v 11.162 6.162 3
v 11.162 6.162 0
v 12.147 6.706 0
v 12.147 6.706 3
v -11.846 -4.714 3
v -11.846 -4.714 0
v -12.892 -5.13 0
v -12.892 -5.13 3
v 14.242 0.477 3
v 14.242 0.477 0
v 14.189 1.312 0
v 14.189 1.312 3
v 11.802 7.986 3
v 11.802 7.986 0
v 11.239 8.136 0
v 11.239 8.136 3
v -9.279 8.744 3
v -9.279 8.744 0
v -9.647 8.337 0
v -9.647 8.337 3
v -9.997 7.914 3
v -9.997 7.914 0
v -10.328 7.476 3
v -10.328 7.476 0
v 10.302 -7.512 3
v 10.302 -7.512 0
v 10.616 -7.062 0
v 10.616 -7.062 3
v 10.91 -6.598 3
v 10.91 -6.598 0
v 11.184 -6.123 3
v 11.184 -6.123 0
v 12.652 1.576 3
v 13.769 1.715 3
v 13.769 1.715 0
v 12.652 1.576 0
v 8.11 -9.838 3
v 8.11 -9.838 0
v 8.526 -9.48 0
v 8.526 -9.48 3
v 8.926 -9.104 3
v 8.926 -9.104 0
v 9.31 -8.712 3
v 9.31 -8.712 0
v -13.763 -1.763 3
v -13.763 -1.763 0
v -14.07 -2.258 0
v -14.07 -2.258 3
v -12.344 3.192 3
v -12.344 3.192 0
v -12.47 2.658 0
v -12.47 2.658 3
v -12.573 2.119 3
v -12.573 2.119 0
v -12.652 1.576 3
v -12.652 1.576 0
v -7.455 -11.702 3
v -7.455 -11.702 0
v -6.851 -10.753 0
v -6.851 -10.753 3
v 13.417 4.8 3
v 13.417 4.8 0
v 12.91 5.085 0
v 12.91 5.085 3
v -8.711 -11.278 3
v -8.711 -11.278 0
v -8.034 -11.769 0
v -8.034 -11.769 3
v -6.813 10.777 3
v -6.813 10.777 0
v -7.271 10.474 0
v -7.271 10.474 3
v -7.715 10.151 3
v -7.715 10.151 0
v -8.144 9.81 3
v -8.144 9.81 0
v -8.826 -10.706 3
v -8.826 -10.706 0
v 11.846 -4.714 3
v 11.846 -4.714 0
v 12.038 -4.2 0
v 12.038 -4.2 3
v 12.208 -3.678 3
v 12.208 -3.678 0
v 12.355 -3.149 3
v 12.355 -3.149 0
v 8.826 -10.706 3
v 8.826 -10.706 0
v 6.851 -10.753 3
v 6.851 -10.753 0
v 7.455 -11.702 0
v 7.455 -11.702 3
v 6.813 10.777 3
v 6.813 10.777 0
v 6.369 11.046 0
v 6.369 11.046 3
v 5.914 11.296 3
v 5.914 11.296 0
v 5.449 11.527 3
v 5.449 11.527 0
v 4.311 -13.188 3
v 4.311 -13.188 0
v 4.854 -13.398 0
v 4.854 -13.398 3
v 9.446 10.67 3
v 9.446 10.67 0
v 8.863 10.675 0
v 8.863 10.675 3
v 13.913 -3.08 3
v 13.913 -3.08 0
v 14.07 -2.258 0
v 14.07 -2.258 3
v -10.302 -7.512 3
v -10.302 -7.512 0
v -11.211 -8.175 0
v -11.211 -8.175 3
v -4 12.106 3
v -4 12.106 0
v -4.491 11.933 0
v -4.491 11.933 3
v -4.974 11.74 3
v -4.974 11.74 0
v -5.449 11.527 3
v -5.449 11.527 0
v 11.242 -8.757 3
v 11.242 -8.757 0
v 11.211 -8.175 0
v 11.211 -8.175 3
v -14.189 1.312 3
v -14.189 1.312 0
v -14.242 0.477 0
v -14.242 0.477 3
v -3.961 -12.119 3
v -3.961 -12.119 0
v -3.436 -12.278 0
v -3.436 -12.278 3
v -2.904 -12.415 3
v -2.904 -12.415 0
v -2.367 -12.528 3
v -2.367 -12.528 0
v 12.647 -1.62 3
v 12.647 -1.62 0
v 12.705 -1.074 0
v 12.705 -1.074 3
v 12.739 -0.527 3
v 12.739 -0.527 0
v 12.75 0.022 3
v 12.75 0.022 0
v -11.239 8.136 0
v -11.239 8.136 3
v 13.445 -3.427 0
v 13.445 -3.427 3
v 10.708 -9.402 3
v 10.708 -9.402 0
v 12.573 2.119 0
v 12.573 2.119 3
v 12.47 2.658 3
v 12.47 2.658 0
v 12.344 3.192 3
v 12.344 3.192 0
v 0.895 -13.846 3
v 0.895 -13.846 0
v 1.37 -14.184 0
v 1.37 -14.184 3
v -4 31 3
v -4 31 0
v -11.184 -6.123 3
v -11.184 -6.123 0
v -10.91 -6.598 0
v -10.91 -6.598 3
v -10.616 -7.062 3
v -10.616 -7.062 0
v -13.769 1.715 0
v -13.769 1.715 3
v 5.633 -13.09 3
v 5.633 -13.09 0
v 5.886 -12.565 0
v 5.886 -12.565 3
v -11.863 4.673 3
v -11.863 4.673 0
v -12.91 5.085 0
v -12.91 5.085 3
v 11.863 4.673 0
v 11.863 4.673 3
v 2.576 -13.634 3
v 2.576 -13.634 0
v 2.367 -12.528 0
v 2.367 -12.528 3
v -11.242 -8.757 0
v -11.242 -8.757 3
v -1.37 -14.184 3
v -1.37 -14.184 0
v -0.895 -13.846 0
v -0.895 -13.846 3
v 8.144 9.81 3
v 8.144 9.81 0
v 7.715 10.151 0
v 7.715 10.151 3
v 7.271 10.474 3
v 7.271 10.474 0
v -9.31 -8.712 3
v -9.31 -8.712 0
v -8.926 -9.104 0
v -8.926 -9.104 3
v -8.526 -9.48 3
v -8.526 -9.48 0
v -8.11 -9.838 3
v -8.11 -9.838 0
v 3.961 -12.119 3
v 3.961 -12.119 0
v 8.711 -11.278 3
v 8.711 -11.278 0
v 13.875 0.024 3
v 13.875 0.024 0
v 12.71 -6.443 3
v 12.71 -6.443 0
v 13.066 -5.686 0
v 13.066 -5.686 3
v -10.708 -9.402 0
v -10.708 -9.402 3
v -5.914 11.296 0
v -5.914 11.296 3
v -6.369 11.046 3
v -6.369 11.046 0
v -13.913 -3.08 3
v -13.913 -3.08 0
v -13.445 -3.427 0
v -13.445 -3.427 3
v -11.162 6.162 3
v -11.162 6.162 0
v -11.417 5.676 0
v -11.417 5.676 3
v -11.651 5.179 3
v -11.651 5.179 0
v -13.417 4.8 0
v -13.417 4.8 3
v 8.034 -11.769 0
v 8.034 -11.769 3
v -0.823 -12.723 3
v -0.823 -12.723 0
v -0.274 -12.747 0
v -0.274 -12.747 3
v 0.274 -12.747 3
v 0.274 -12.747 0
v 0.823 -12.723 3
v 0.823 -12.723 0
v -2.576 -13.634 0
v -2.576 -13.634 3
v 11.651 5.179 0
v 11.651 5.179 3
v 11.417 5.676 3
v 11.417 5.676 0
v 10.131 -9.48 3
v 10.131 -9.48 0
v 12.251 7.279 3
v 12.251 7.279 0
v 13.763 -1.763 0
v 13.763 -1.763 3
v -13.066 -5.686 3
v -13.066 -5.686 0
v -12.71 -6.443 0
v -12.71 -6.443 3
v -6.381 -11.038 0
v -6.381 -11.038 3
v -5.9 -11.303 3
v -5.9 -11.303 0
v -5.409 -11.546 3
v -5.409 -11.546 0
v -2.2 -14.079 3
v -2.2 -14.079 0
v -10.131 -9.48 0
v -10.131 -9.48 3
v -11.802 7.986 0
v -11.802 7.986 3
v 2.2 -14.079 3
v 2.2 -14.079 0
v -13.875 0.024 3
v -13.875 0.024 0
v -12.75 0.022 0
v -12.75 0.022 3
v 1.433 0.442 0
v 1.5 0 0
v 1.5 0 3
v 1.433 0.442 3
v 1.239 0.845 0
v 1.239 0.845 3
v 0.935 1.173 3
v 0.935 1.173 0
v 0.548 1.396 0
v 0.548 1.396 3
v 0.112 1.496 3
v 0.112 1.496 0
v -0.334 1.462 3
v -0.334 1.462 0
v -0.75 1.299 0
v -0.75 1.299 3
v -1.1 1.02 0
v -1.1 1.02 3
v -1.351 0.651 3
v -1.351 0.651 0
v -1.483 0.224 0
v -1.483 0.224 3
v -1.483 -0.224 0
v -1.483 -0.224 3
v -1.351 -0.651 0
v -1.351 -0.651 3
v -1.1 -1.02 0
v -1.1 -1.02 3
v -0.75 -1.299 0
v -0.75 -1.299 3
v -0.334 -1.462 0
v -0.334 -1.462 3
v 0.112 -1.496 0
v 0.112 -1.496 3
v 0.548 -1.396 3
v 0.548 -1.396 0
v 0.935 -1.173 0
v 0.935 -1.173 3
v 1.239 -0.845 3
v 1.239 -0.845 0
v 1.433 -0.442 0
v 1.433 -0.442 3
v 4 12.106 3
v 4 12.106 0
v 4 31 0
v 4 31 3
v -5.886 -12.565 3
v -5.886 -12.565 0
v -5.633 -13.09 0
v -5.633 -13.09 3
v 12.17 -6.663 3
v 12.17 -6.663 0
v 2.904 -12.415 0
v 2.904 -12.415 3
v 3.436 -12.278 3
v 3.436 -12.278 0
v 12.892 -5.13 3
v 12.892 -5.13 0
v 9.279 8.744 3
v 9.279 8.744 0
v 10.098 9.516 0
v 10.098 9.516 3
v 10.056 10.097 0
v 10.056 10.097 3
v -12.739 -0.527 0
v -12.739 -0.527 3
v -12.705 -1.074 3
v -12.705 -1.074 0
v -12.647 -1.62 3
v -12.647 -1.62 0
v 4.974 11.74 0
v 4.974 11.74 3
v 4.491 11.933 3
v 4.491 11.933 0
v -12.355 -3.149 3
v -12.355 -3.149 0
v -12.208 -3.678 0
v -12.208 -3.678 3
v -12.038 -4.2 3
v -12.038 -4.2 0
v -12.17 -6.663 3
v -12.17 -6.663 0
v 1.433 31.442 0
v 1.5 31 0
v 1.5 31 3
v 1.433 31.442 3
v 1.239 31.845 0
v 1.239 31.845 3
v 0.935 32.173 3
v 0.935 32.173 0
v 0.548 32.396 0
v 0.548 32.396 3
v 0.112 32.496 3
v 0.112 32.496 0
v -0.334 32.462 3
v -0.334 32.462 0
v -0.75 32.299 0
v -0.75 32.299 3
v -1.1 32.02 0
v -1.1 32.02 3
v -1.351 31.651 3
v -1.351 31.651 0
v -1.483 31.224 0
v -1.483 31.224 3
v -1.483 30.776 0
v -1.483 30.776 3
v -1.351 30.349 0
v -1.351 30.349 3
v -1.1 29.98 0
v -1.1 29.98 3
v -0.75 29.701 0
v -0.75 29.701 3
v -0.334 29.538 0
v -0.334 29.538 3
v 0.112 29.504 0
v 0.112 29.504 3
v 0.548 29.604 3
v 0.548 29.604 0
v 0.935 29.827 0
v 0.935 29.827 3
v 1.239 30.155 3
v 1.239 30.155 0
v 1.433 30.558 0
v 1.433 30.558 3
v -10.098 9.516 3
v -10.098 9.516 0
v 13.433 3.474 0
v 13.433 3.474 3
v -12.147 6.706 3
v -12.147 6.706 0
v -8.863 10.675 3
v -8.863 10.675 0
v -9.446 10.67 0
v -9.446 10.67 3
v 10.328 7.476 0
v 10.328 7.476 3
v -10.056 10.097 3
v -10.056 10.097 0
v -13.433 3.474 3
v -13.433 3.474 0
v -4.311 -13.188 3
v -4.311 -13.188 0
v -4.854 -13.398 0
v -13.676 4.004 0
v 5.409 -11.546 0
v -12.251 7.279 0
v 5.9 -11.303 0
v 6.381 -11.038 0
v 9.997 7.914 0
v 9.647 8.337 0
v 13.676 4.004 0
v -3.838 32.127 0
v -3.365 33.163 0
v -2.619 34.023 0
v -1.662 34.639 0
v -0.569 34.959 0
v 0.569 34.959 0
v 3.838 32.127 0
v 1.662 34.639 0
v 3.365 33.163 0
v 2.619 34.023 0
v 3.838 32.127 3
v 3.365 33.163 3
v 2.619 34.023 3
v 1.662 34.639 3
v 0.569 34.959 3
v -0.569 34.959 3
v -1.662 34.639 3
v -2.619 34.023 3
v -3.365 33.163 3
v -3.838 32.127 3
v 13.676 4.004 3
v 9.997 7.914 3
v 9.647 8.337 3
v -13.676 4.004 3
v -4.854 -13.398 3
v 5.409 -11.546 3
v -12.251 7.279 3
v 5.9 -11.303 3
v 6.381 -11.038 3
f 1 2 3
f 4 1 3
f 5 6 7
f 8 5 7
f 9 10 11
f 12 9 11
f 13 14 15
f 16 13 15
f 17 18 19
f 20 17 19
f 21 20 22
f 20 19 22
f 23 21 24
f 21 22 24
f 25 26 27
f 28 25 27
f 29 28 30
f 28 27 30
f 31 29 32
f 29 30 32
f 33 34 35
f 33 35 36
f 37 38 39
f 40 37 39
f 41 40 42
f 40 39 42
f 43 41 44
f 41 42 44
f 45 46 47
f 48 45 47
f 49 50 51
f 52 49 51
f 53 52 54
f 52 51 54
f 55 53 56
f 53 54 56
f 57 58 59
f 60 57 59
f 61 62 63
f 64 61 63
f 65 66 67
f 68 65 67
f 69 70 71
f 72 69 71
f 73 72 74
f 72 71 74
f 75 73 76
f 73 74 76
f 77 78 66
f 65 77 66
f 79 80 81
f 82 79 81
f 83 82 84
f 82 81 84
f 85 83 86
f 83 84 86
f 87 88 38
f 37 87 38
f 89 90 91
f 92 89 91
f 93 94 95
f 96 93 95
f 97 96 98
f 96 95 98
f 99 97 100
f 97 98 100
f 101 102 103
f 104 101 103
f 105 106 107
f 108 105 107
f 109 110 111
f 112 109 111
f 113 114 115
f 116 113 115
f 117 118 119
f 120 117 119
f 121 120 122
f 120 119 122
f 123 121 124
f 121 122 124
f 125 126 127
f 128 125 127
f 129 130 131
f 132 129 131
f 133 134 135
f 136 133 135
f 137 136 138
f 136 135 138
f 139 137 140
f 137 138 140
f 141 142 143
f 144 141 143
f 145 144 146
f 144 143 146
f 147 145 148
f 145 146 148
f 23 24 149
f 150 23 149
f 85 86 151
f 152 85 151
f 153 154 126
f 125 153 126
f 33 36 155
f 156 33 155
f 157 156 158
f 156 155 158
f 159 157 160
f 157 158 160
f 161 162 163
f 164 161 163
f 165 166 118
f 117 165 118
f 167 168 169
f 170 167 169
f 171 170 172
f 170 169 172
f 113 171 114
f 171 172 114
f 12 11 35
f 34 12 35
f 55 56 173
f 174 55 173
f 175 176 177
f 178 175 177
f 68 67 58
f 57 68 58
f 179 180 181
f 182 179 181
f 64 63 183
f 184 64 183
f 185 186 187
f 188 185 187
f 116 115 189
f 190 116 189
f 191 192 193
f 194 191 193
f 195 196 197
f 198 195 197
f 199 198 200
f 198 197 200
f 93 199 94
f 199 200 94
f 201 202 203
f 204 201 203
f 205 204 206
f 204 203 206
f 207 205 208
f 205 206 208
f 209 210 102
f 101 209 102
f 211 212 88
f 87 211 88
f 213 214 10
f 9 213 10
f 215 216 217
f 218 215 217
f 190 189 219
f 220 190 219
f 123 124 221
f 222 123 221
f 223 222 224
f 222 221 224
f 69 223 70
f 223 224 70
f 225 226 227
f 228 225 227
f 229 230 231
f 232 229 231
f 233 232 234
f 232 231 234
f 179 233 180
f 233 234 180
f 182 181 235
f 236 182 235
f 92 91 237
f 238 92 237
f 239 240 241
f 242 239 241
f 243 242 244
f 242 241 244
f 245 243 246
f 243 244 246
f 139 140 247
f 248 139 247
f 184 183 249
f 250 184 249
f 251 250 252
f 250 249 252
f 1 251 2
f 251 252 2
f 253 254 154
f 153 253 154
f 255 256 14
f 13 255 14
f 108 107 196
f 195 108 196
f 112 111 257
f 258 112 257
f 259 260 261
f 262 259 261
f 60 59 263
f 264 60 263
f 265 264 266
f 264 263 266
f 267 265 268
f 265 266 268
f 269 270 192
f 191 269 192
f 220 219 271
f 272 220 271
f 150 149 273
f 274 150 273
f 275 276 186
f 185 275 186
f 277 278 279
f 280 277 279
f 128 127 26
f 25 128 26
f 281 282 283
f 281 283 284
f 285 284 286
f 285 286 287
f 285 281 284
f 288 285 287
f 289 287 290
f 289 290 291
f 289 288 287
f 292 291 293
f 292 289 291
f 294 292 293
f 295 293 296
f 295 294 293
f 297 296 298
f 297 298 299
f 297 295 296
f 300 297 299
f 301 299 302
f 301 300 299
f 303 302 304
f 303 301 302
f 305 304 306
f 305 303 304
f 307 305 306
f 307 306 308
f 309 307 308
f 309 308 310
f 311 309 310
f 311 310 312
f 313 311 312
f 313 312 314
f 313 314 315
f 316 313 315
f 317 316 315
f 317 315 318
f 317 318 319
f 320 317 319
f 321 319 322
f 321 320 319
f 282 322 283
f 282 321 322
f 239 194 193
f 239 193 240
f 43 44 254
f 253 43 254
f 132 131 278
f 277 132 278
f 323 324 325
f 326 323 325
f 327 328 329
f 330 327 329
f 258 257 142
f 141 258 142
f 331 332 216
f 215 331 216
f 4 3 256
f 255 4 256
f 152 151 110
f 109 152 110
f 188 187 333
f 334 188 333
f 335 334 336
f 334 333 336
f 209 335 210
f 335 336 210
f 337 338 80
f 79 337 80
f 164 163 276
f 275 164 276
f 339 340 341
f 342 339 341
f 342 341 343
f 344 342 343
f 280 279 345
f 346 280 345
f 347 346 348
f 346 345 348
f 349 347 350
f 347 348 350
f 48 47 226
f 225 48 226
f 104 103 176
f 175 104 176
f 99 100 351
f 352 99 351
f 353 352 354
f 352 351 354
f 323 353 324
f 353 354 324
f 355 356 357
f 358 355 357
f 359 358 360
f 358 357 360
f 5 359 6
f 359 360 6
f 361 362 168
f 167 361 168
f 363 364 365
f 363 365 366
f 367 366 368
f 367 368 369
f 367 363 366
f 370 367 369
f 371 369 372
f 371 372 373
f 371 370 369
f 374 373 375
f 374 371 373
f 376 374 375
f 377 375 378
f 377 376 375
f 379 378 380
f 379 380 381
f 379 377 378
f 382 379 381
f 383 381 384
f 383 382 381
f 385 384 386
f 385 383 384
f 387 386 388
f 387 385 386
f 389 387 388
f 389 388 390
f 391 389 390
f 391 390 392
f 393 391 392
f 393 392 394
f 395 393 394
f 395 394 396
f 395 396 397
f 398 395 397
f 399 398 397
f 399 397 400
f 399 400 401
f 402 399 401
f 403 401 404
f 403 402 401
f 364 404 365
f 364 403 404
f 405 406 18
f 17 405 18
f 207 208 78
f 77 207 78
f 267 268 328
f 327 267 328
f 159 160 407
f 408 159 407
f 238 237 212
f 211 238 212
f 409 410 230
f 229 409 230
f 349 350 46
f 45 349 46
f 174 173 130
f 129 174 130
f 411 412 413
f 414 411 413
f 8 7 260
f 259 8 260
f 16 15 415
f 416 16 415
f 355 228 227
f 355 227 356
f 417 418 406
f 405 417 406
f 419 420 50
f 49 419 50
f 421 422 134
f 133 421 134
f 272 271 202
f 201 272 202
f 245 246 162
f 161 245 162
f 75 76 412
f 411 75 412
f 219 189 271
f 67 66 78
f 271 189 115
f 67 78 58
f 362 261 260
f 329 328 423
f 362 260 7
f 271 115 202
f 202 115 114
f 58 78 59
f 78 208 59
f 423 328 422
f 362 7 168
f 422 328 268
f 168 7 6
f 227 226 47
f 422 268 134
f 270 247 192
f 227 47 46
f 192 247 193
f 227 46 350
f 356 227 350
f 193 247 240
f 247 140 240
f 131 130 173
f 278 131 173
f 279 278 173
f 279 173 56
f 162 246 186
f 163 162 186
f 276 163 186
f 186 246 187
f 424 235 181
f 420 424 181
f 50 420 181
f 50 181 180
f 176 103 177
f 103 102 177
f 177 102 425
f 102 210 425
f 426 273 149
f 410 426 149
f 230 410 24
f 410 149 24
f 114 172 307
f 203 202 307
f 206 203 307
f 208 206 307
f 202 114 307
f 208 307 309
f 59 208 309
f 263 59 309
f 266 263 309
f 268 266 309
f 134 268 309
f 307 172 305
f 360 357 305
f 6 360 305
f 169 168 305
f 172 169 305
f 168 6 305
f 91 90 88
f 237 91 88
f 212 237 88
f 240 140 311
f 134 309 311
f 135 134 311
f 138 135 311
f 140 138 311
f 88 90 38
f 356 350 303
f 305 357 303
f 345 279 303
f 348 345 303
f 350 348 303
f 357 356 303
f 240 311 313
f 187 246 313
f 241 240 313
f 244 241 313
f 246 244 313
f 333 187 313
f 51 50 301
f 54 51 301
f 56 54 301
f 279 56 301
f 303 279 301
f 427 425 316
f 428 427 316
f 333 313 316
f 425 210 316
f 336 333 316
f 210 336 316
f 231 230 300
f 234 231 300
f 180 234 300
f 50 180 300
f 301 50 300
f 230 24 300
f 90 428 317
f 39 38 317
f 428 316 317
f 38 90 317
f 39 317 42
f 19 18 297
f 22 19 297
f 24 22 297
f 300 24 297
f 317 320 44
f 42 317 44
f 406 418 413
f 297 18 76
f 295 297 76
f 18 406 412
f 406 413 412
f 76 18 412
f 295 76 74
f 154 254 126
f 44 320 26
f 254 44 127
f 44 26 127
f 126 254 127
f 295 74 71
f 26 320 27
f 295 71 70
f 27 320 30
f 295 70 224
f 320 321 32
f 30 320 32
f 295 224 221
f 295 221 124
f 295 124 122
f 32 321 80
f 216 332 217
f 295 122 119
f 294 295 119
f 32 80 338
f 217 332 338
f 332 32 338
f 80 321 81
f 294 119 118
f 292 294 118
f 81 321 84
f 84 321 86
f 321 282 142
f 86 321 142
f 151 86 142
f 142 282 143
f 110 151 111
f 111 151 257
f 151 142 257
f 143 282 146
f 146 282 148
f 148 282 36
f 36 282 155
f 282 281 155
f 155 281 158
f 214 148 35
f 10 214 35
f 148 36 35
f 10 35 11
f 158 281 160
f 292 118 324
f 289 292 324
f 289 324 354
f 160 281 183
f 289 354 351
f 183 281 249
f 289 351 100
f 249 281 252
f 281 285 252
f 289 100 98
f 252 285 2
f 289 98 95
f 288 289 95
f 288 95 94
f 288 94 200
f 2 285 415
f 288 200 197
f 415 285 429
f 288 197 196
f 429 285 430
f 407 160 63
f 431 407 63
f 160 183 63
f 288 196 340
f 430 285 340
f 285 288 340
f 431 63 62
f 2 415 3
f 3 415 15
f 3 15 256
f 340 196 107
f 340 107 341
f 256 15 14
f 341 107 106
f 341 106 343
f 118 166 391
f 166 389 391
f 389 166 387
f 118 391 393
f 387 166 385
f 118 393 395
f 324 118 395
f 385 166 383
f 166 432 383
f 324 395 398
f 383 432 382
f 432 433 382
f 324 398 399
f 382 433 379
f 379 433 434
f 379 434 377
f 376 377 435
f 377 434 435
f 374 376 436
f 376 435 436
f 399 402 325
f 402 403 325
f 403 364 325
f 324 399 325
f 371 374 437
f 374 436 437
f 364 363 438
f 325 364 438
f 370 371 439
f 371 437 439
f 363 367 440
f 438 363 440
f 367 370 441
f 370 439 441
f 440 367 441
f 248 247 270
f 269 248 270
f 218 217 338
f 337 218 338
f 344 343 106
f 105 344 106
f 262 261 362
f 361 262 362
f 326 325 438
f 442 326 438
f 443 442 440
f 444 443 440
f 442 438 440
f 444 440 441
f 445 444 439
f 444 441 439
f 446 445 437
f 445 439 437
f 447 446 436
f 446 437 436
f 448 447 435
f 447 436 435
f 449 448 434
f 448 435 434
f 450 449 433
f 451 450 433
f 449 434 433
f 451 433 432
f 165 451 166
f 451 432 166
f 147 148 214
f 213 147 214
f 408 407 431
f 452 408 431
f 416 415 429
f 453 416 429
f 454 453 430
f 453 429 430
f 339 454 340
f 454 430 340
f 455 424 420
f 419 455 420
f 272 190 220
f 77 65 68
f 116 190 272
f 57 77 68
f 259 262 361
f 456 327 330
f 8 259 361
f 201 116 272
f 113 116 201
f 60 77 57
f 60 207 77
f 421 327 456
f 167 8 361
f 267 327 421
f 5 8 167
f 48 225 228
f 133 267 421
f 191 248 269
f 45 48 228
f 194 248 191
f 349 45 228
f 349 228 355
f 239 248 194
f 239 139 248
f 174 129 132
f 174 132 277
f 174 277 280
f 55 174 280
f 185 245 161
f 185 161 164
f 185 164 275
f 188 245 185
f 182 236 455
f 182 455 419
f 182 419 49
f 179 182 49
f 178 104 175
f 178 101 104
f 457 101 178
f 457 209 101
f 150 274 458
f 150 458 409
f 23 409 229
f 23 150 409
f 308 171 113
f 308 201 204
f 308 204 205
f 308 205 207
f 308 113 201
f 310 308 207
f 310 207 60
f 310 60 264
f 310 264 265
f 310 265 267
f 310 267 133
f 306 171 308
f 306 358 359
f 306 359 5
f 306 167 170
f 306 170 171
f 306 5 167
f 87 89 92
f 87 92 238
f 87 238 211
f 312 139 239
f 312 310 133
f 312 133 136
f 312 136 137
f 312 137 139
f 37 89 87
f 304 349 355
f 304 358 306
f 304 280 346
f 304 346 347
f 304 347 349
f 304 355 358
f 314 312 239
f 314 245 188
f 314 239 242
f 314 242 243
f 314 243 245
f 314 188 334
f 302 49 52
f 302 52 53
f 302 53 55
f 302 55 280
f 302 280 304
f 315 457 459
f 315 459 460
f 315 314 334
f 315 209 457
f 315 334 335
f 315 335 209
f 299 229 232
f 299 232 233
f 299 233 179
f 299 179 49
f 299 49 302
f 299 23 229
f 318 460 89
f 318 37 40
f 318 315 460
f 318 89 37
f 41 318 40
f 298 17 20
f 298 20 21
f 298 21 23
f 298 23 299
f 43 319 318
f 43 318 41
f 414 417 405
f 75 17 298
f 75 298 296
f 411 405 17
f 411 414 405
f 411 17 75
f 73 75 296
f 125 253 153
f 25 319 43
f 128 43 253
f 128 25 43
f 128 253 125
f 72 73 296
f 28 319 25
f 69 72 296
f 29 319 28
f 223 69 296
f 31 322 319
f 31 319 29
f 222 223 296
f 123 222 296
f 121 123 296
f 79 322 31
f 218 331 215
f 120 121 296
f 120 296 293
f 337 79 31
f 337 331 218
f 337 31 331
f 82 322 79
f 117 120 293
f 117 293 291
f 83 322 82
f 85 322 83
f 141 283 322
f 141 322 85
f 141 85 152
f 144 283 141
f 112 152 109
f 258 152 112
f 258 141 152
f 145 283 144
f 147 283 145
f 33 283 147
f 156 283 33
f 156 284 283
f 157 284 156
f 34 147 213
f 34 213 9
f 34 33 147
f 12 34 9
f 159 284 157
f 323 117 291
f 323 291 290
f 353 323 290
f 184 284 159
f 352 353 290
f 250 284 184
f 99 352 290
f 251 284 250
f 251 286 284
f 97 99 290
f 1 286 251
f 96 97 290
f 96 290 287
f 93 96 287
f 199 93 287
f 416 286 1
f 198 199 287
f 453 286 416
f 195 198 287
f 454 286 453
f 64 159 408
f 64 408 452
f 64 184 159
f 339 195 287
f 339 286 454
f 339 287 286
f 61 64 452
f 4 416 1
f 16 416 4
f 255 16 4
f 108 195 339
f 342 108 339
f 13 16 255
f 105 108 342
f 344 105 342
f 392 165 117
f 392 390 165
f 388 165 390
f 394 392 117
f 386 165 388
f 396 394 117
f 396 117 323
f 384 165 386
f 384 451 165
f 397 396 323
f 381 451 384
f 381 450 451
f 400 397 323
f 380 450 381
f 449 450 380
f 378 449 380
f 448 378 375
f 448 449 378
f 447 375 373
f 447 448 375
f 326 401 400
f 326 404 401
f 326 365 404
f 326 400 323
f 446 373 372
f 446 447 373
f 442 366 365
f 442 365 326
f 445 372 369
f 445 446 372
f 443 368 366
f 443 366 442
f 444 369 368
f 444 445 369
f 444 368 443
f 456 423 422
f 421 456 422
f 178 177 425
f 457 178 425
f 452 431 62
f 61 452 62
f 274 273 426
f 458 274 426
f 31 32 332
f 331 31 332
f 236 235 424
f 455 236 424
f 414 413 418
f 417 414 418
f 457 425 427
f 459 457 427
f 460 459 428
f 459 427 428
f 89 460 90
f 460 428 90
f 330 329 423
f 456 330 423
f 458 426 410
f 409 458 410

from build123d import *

# Parameters (mm, degrees)
SKETCH1_R           = 1.5
BOSS_EXTRUDE2_DEPTH = 3


with BuildPart() as part:
    # Sketch1 → Boss-Extrude2 (new body)
    with BuildSketch(Plane.XY):
        with BuildLine():
            Line((-4, 31), (-4, 12.106300013))
            ThreePointArc((-4, 12.106300013), (-4.733275563, 11.838859846), (-5.448812758, 11.527052508))
            ThreePointArc((-5.448812758, 11.527052508), (-6.142359345, 11.172910171), (-6.812992455, 10.777088374))
            ThreePointArc((-6.812992455, 10.777088374), (-7.494261967, 10.314966678), (-8.144289673, 9.809844327))
            Line((-8.144289673, 9.809844327), (-8.862903468, 10.675418826))
            Line((-8.862903468, 10.675418826), (-9.445525531, 10.669796035))
            Line((-9.445525531, 10.669796035), (-10.055652175, 10.096848981))
            Line((-10.055652175, 10.096848981), (-10.097847012, 9.515729647))
            Line((-10.097847012, 9.515729647), (-9.27910266, 8.744184))
            ThreePointArc((-9.27910266, 8.744184), (-9.824043845, 8.127155869), (-10.328030916, 7.476247548))
            Line((-10.328030916, 7.476247548), (-11.239327761, 8.13591645))
            Line((-11.239327761, 8.13591645), (-11.80224735, 7.985578094))
            Line((-11.80224735, 7.985578094), (-12.250719604, 7.278898898))
            Line((-12.250719604, 7.278898898), (-12.147070312, 6.705543068))
            Line((-12.147070312, 6.705543068), (-11.162172719, 6.161850387))
            ThreePointArc((-11.162172719, 6.161850387), (-11.536544919, 5.428685967), (-11.862823992, 4.672890641))
            Line((-11.862823992, 4.672890641), (-12.909543756, 5.085204521))
            Line((-12.909543756, 5.085204521), (-13.417390562, 4.799596912))
            Line((-13.417390562, 4.799596912), (-13.676029266, 4.003588828))
            Line((-13.676029266, 4.003588828), (-13.43304851, 3.474022556))
            Line((-13.43304851, 3.474022556), (-12.343882415, 3.192345052))
            ThreePointArc((-12.343882415, 3.192345052), (-12.524162447, 2.389111761), (-12.652232208, 1.575918828))
            Line((-12.652232208, 1.575918828), (-13.768605638, 1.71497049))
            Line((-13.768605638, 1.71497049), (-14.189469779, 1.312039404))
            Line((-14.189469779, 1.312039404), (-14.242023712, 0.476718548))
            Line((-14.242023712, 0.476718548), (-13.874978867, 0.024216431))
            Line((-13.874978867, 0.024216431), (-12.749980581, 0.022252937))
            ThreePointArc((-12.749980581, 0.022252937), (-12.724840787, -0.800579124), (-12.646654143, -1.62007376))
            Line((-12.646654143, -1.62007376), (-13.762535391, -1.763021444))
            Line((-13.762535391, -1.763021444), (-14.069972424, -2.257958364))
            Line((-14.069972424, -2.257958364), (-13.91313943, -3.080105712))
            Line((-13.91313943, -3.080105712), (-13.445093273, -3.427111302))
            Line((-13.445093273, -3.427111302), (-12.354950575, -3.149237412))
            ThreePointArc((-12.354950575, -3.149237412), (-12.125970583, -3.939966678), (-11.846440287, -4.714271155))
            Line((-11.846440287, -4.714271155), (-12.89171443, -5.130236257))
            Line((-12.89171443, -5.130236257), (-13.066406957, -5.686080305))
            Line((-13.066406957, -5.686080305), (-12.710041429, -6.443395602))
            Line((-12.710041429, -6.443395602), (-12.170403021, -6.663101027))
            Line((-12.170403021, -6.663101027), (-11.183613587, -6.122849592))
            ThreePointArc((-11.183613587, -6.122849592), (-10.76518105, -6.831791636), (-10.30187102, -7.512253556))
            Line((-10.30187102, -7.512253556), (-11.210859639, -8.175099458))
            Line((-11.210859639, -8.175099458), (-11.241831085, -8.756924908))
            Line((-11.241831085, -8.756924908), (-10.70832478, -9.401823249))
            Line((-10.70832478, -9.401823249), (-10.131001588, -9.48042361))
            Line((-10.131001588, -9.48042361), (-9.309569027, -8.711740614))
            ThreePointArc((-9.309569027, -8.711740614), (-8.727975601, -9.29435), (-8.109997309, -9.838213438))
            Line((-8.109997309, -9.838213438), (-8.825585306, -10.706291095))
            Line((-8.825585306, -10.706291095), (-8.710889622, -11.277539713))
            Line((-8.710889622, -11.277539713), (-8.033764703, -11.769499764))
            Line((-8.033764703, -11.769499764), (-7.455032066, -11.702056311))
            Line((-7.455032066, -11.702056311), (-6.850570006, -10.753240934))
            ThreePointArc((-6.850570006, -10.753240934), (-6.142359345, -11.172910171), (-5.40854264, -11.546002187))
            Line((-5.40854264, -11.546002187), (-5.885766991, -12.564767086))
            Line((-5.885766991, -12.564767086), (-5.632610928, -13.089545223))
            Line((-5.632610928, -13.089545223), (-4.854413643, -13.397655324))
            Line((-4.854413643, -13.397655324), (-4.310635461, -13.188405776))
            Line((-4.310635461, -13.188405776), (-3.961124478, -12.119075578))
            ThreePointArc((-3.961124478, -12.119075578), (-3.170796061, -12.349435304), (-2.367249346, -12.528313156))
            Line((-2.367249346, -12.528313156), (-2.576124288, -13.633752552))
            Line((-2.576124288, -13.633752552), (-2.200414573, -14.079086466))
            Line((-2.200414573, -14.079086466), (-1.370041921, -14.183986927))
            Line((-1.370041921, -14.183986927), (-0.895385777, -13.846079204))
            Line((-0.895385777, -13.846079204), (-0.82278693, -12.723424133))
            ThreePointArc((-0.82278693, -12.723424133), (0, -12.75), (0.82278693, -12.723424133))
            Line((0.82278693, -12.723424133), (0.895385777, -13.846079204))
            Line((0.895385777, -13.846079204), (1.370041921, -14.183986927))
            Line((1.370041921, -14.183986927), (2.200414573, -14.079086466))
            Line((2.200414573, -14.079086466), (2.576124288, -13.633752552))
            Line((2.576124288, -13.633752552), (2.367249346, -12.528313156))
            ThreePointArc((2.367249346, -12.528313156), (3.170796061, -12.349435304), (3.961124478, -12.119075578))
            Line((3.961124478, -12.119075578), (4.310635461, -13.188405776))
            Line((4.310635461, -13.188405776), (4.854413643, -13.397655324))
            Line((4.854413643, -13.397655324), (5.632610928, -13.089545223))
            Line((5.632610928, -13.089545223), (5.885766991, -12.564767086))
            Line((5.885766991, -12.564767086), (5.40854264, -11.546002187))
            ThreePointArc((5.40854264, -11.546002187), (6.142359345, -11.172910171), (6.850570006, -10.753240934))
            Line((6.850570006, -10.753240934), (7.455032066, -11.702056311))
            Line((7.455032066, -11.702056311), (8.033764703, -11.769499764))
            Line((8.033764703, -11.769499764), (8.710889622, -11.277539713))
            Line((8.710889622, -11.277539713), (8.825585306, -10.706291095))
            Line((8.825585306, -10.706291095), (8.109997309, -9.838213438))
            ThreePointArc((8.109997309, -9.838213438), (8.727975601, -9.29435), (9.309569027, -8.711740614))
            Line((9.309569027, -8.711740614), (10.131001588, -9.48042361))
            Line((10.131001588, -9.48042361), (10.70832478, -9.401823249))
            Line((10.70832478, -9.401823249), (11.241831085, -8.756924908))
            Line((11.241831085, -8.756924908), (11.210859639, -8.175099458))
            Line((11.210859639, -8.175099458), (10.30187102, -7.512253556))
            ThreePointArc((10.30187102, -7.512253556), (10.76518105, -6.831791636), (11.183613587, -6.122849592))
            Line((11.183613587, -6.122849592), (12.170403021, -6.663101027))
            Line((12.170403021, -6.663101027), (12.710041429, -6.443395602))
            Line((12.710041429, -6.443395602), (13.066406957, -5.686080305))
            Line((13.066406957, -5.686080305), (12.89171443, -5.130236257))
            Line((12.89171443, -5.130236257), (11.846440287, -4.714271155))
            ThreePointArc((11.846440287, -4.714271155), (12.125970583, -3.939966678), (12.354950575, -3.149237412))
            Line((12.354950575, -3.149237412), (13.445093273, -3.427111302))
            Line((13.445093273, -3.427111302), (13.91313943, -3.080105712))
            Line((13.91313943, -3.080105712), (14.069972424, -2.257958364))
            Line((14.069972424, -2.257958364), (13.762535391, -1.763021444))
            Line((13.762535391, -1.763021444), (12.646654143, -1.62007376))
            ThreePointArc((12.646654143, -1.62007376), (12.724840787, -0.800579124), (12.749980581, 0.022252937))
            Line((12.749980581, 0.022252937), (13.874978867, 0.024216431))
            Line((13.874978867, 0.024216431), (14.242023712, 0.476718548))
            Line((14.242023712, 0.476718548), (14.189469779, 1.312039404))
            Line((14.189469779, 1.312039404), (13.768605638, 1.71497049))
            Line((13.768605638, 1.71497049), (12.652232208, 1.575918828))
            ThreePointArc((12.652232208, 1.575918828), (12.524162447, 2.389111761), (12.343882415, 3.192345052))
            Line((12.343882415, 3.192345052), (13.43304851, 3.474022556))
            Line((13.43304851, 3.474022556), (13.676029266, 4.003588828))
            Line((13.676029266, 4.003588828), (13.417390562, 4.799596912))
            Line((13.417390562, 4.799596912), (12.909543756, 5.085204521))
            Line((12.909543756, 5.085204521), (11.862823992, 4.672890641))
            ThreePointArc((11.862823992, 4.672890641), (11.536544919, 5.428685967), (11.162172719, 6.161850387))
            Line((11.162172719, 6.161850387), (12.147070312, 6.705543068))
            Line((12.147070312, 6.705543068), (12.250719604, 7.278898898))
            Line((12.250719604, 7.278898898), (11.80224735, 7.985578094))
            Line((11.80224735, 7.985578094), (11.239327761, 8.13591645))
            Line((11.239327761, 8.13591645), (10.328030916, 7.476247548))
            ThreePointArc((10.328030916, 7.476247548), (9.824043845, 8.127155869), (9.27910266, 8.744184))
            Line((9.27910266, 8.744184), (10.097847012, 9.515729647))
            Line((10.097847012, 9.515729647), (10.055652175, 10.096848981))
            Line((10.055652175, 10.096848981), (9.445525531, 10.669796035))
            Line((9.445525531, 10.669796035), (8.862903468, 10.675418826))
            Line((8.862903468, 10.675418826), (8.144289673, 9.809844327))
            ThreePointArc((8.144289673, 9.809844327), (7.494261967, 10.314966678), (6.812992455, 10.777088374))
            ThreePointArc((6.812992455, 10.777088374), (6.142359345, 11.172910171), (5.448812758, 11.527052508))
            ThreePointArc((5.448812758, 11.527052508), (4.733275563, 11.838859846), (4, 12.106300013))
            Line((4, 12.106300013), (4, 31))
            ThreePointArc((4, 31), (0, 35), (-4, 31))
        make_face()
        Circle(SKETCH1_R, mode=Mode.SUBTRACT)
        with Locations((0, 31)):
            Circle(SKETCH1_R, mode=Mode.SUBTRACT)
    extrude(amount=BOSS_EXTRUDE2_DEPTH)


solid = part.part
